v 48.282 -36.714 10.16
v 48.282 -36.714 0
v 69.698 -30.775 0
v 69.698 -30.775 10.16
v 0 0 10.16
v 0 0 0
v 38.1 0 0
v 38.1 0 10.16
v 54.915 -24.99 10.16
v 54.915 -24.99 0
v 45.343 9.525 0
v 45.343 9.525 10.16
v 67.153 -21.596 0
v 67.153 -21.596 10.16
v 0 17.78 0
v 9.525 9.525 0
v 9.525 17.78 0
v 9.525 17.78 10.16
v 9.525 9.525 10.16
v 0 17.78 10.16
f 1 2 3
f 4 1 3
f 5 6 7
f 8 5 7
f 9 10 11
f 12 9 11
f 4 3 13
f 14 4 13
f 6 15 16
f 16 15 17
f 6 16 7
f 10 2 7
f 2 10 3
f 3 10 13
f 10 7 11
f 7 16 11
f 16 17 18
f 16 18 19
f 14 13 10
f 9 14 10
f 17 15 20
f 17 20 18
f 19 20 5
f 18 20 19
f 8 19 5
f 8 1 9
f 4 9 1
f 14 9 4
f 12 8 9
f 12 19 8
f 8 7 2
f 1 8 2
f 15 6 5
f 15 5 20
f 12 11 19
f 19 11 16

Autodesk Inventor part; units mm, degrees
ref_plane "YZ Plane" through (0, 0, 0) normal (1, 0, 0) x (0, 1, 0)
ref_plane "XZ Plane" through (0, 0, 0) normal (0, 1, 0) x (-1, 0, 0)
ref_plane "XY Plane" through (0, 0, 0) normal (0, 0, 1) x (1, 0, 0)
sketch "Sketch1" plane through (0, 0, 0) normal (0, 0, 1) x (1, 0, 0)
  line L0 (0, 0) -> (38.1, 0)
  line L1 (38.1, 0) -> (48.2818, -36.7143)
  line L2 (38.1, 0) -> (76.2, 0) construction
  line L3 (45.343, 9.525) -> (9.525, 9.525)
  line L4 (0, 0) -> (0, 17.78)
  line L5 (0, 17.78) -> (9.525, 17.78)
  line L6 (9.525, 17.78) -> (9.525, 9.525)
  line L7 (0, 9.525) -> (9.525, 9.525)
  line L8 (45.343, 9.525) -> (38.1, 0)
  line L9 (48.2818, -36.7143) -> (69.6985, -30.7749)
  line L10 (69.6985, -30.7749) -> (67.153, -21.5964)
  line L11 (67.153, -21.5964) -> (54.9149, -24.9903)
  line L12 (54.9149, -24.9903) -> (45.343, 9.525)
  dimension "d0" = 38.1
  dimension "d1" = 38.1
  dimension "d2" = 74.5
  dimension "d9" = 17.78
  dimension "d10" = 9.525
  dimension "d11" = 9.525
  dimension "d12" = 22.225
  dimension "d13" = 9.525
  dimension "d14" = 12.7
extrude "Extrusion1" add sketch "Sketch1" along normal blind 10.16
properties part number "AttachmentPlateHopper_v3"
